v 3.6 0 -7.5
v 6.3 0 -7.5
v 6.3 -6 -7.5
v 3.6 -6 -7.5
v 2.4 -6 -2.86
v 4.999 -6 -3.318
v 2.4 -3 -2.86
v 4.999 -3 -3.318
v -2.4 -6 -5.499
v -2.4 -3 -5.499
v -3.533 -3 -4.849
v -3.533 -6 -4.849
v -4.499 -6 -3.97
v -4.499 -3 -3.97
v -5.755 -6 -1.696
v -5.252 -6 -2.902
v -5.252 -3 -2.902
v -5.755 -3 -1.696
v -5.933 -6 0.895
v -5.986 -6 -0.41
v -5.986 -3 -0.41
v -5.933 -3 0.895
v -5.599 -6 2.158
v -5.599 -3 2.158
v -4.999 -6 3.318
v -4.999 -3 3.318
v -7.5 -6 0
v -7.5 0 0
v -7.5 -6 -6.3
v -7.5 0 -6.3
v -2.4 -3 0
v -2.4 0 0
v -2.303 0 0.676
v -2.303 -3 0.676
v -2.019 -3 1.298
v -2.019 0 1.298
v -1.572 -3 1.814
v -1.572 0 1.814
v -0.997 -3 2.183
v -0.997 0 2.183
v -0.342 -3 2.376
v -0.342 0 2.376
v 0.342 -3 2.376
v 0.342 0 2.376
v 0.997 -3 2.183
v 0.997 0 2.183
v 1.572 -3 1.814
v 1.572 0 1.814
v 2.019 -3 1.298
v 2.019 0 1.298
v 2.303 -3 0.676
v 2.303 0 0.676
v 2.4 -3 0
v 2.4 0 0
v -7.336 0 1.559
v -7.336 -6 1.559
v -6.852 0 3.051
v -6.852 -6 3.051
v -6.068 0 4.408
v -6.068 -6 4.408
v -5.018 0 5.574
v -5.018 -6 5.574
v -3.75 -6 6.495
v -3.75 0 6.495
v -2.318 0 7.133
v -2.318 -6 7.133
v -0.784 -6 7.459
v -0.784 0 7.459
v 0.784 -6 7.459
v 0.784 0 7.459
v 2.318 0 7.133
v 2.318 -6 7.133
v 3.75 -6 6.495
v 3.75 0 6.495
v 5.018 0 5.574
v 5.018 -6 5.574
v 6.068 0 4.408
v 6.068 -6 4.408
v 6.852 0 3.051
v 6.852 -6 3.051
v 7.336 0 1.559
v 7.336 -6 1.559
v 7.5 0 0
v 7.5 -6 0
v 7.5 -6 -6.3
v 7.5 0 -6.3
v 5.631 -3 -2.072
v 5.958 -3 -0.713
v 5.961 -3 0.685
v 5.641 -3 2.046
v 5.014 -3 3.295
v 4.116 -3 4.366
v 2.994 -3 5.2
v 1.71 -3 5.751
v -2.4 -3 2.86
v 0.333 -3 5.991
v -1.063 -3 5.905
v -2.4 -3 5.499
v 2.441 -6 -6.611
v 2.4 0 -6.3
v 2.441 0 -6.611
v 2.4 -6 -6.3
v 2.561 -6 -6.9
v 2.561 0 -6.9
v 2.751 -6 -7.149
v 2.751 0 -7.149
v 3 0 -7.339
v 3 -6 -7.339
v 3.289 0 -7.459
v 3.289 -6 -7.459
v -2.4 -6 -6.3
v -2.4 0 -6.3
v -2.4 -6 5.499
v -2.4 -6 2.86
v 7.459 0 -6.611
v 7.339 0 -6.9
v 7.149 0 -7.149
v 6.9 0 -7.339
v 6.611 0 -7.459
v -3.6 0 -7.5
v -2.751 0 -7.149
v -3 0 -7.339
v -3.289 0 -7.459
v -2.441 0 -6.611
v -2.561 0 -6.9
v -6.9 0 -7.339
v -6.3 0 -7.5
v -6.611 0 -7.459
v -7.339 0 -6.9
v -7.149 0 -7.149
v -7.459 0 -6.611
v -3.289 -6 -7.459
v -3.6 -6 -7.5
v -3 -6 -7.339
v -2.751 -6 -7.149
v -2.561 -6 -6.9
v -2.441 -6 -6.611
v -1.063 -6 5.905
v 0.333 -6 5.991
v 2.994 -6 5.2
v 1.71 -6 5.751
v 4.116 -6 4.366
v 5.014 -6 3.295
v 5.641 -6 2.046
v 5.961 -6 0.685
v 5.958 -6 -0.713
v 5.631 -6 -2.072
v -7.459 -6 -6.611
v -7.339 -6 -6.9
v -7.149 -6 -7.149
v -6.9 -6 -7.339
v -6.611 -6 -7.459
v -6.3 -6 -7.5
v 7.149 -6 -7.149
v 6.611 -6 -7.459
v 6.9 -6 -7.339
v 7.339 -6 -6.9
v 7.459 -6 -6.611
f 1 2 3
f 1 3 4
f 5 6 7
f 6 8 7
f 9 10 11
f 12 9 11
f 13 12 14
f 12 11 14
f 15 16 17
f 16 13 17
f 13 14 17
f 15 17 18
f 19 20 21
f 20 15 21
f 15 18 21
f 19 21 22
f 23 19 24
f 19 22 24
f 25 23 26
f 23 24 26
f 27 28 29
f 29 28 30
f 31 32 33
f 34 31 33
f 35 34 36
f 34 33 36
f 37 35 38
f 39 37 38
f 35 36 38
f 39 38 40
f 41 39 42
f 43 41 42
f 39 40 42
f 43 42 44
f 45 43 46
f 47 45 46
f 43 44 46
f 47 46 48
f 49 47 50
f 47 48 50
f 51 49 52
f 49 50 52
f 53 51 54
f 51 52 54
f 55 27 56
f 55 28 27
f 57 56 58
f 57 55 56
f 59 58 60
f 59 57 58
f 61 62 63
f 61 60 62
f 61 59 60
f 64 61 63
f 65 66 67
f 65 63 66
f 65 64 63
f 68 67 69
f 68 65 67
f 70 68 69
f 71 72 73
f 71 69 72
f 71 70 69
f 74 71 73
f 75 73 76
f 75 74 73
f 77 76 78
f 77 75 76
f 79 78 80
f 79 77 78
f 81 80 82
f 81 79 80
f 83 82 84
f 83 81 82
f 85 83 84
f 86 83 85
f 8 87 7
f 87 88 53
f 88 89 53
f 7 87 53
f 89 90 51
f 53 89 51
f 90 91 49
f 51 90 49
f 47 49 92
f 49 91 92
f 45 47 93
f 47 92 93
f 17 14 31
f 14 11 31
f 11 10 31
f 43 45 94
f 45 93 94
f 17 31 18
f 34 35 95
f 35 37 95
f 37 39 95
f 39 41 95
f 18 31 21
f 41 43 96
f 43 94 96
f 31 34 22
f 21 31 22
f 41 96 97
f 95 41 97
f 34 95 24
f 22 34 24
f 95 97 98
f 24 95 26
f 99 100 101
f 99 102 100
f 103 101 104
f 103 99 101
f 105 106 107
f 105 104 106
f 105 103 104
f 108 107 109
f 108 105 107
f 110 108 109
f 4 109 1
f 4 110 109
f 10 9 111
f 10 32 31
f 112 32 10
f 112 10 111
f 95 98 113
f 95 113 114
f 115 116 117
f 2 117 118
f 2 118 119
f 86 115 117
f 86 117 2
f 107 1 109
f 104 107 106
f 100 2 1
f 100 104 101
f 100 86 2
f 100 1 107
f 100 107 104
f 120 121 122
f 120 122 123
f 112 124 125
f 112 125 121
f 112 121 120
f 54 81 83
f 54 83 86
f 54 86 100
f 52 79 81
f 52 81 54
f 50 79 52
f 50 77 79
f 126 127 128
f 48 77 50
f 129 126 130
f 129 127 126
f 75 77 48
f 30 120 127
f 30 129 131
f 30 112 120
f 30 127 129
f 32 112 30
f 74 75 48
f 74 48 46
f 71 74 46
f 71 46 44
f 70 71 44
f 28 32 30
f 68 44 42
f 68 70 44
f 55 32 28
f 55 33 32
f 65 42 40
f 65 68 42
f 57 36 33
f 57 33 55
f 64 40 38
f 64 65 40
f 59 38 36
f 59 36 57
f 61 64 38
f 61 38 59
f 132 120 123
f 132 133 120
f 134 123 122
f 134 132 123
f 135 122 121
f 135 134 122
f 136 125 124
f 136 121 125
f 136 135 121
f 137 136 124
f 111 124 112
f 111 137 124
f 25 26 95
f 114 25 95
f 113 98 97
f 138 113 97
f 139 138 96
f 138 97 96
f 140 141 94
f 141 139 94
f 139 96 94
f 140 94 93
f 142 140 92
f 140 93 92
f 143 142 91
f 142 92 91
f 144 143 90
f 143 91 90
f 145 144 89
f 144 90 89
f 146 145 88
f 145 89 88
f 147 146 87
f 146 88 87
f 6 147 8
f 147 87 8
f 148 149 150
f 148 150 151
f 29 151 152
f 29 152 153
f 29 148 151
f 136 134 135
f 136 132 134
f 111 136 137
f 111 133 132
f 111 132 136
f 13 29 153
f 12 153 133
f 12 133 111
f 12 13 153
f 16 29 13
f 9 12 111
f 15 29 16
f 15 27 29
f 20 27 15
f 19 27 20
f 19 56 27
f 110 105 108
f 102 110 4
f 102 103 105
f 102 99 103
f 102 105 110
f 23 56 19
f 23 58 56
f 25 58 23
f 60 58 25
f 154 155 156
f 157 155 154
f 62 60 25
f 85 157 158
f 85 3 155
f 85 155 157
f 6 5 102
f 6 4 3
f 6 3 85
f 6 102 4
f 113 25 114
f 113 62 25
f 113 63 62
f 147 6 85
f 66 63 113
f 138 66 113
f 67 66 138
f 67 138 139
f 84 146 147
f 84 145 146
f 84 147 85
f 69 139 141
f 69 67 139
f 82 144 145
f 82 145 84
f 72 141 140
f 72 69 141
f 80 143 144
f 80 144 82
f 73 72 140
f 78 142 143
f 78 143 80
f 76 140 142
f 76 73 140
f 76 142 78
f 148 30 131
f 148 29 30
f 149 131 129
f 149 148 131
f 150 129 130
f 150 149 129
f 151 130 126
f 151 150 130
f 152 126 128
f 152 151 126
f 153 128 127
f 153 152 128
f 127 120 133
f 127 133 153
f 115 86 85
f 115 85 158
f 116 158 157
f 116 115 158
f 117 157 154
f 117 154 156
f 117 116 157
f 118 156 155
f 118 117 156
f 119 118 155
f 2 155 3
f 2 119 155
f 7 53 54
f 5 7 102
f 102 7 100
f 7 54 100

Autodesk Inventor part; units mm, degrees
ref_plane "YZ Plane" through (0, 0, 0) normal (1, 0, 0) x (0, 1, 0)
ref_plane "XZ Plane" through (0, 0, 0) normal (0, 1, 0) x (-1, 0, 0)
ref_plane "XY Plane" through (0, 0, 0) normal (0, 0, 1) x (1, 0, 0)
sketch "Sketch1" plane through (0, 0, 0) normal (0, 1, 0) x (-1, 0, 0)
  arc A0 (7.5, 0) -> (-7.5, 0) centre (0, 0) ccw
  arc A1 (2.4, 0) -> (-2.4, 0) centre (0, 0) ccw
  line L0 (-7.5, 0) -> (7.5, 0) construction
  line L1 (0, 0) -> (0, 11.6178) construction
  line L2 (-7.5, 0) -> (-7.5, -7.5)
  line L3 (-2.4, 0) -> (-2.4, -7.5)
  line L4 (2.4, 0) -> (2.4, -7.5)
  line L5 (7.5, 0) -> (7.5, -7.5)
  line L6 (-7.5, -7.5) -> (-2.4, -7.5)
  line L7 (2.4, -7.5) -> (7.5, -7.5)
  dimension "d0" = 15
  dimension "d2" = 7.5
  dimension "d3" = 4.8
  dimension "d6" = 7.5
  dimension "d8" = 7.5
extrude "Extrusion1" add sketch "Sketch1" against normal blind 3
sketch "Sketch2" plane through (0, -3, 0) normal (0, -1, 0) x (1, 0, 0)
  arc A0 (7.5, 0) -> (-7.5, 0) centre (0, 0) ccw projected
  line L0 (-7.5, 0) -> (-7.5, -7.5) projected
  line L1 (-2.4, -7.5) -> (-2.4, 0) projected
  arc A1 (2.4, 0) -> (-2.4, 0) centre (0, 0) ccw projected
  line L2 (2.4, 0) -> (2.4, -7.5) projected
  line L3 (7.5, -7.5) -> (7.5, 0) projected
  arc A2 (2.4, -5.4991) -> (-2.4, -5.4991) centre (0, 0) ccw
  arc A3 (7.5, 0) -> (-7.5, 0) centre (0, 0) ccw
  line L4 (-7.5, 0) -> (-7.5, -7.5)
  line L5 (-2.4, -7.5) -> (-2.4, -5.4991)
  line L6 (2.4, -5.4991) -> (2.4, -7.5)
  line L7 (7.5, -7.5) -> (7.5, 0)
  line L8 (-7.5, -7.5) -> (-2.4, -7.5)
  line L9 (2.4, -7.5) -> (7.5, -7.5)
  dimension "d11" = 6
extrude "Extrusion2" add sketch "Sketch2" along normal blind 3 contours L3 L9 L2 A2 L1 L8 L0 A0
fillet "Fillet1" radius 1.2 1 edges at (7.5, -3, -7.5)
fillet "Fillet2" radius 1.2 3 edges at (2.4, -3, -7.5) (-2.4, -3, -7.5) (-7.5, -3, -7.5)
sketch "Sketch3" plane through (0, -3, 0) normal (0, -1, 0) x (1, 0, 0)
  arc A0 (2.4, -5.4991) -> (-2.4, -5.4991) centre (0, 0) ccw projected
  line L0 (-2.4, -5.4991) -> (-2.4, 0) projected
  arc A1 (2.4, 0) -> (-2.4, 0) centre (0, 0) ccw projected
  line L1 (2.4, 0) -> (2.4, -5.4991) projected
  line L2 (0, 13.9059) -> (0, -15.9339) construction
  line L3 (-15.9969, 0.3837) -> (17.7517, -5.5671) construction
  line L4 (-15.1634, 5.1107) -> (18.5852, -0.84) construction
  line L5 (-2.4, -15.573) -> (-2.4, 20.0388) construction
  line L6 (2.4, -5.4991) -> (2.4, -2.8602)
  line L7 (4.9988, -3.3184) -> (2.4, -2.8602)
  line L8 (-4.9988, 3.3184) -> (-2.4, 2.8602)
  line L9 (-2.4, 5.4991) -> (-2.4, 2.8602)
  arc A2 (-3, 5.1962) -> (-4.9988, 3.3184) centre (0, 0) ccw
  arc A3 (2.4, -5.4991) -> (4.9988, -3.3184) centre (0, 0) ccw
  dimension "d27" = 80
extrude "Extrusion3" add sketch "Sketch3" along normal blind 3 contours L1 L7 A0 | L9 L8 A0
equation "\"d0\" = HeadConnectorOuterSize"
equation "\"d2\" = 0.5 * HeadConnectorOuterSize"
equation "\"d3\" = HeadConnectorWidth"
equation "\"d6\" = 0.5 * HeadConnectorOuterSize"
equation "\"d8\" = 0.5 * HeadConnectorOuterSize"
equation "\"d9\" = HeadConnectorOuterHeight"
equation "\"d11\" = 0.5 * HeadConnectorDiam"
equation "\"d12\" = HeadConnectorHeight"
equation "\"d14\" = 2 * HeadConnectorProportion"
equation "\"d15\" = 2 * HeadConnectorProportion"
equation "\"d28\" = HeadConnectorHeight"
equation "\"HeadConnectorDiam\" = 20 * HeadConnectorProportion"
equation "\"HeadConnectorWidth\" = 8 * HeadConnectorProportion"
equation "\"HeadConnectorOuterSize\" = 25 * HeadConnectorProportion"
equation "\"HeadConnectorHeight\" = 5 * HeadConnectorProportion"
equation "\"HeadConnectorOuterHeight\" = 5 * HeadConnectorProportion"
equation "\"HeadConnectorTolerance\" = 0.2"
equation "\"HeadConnectorProportion\" = 0.6"
properties part number "HeadConnector"
